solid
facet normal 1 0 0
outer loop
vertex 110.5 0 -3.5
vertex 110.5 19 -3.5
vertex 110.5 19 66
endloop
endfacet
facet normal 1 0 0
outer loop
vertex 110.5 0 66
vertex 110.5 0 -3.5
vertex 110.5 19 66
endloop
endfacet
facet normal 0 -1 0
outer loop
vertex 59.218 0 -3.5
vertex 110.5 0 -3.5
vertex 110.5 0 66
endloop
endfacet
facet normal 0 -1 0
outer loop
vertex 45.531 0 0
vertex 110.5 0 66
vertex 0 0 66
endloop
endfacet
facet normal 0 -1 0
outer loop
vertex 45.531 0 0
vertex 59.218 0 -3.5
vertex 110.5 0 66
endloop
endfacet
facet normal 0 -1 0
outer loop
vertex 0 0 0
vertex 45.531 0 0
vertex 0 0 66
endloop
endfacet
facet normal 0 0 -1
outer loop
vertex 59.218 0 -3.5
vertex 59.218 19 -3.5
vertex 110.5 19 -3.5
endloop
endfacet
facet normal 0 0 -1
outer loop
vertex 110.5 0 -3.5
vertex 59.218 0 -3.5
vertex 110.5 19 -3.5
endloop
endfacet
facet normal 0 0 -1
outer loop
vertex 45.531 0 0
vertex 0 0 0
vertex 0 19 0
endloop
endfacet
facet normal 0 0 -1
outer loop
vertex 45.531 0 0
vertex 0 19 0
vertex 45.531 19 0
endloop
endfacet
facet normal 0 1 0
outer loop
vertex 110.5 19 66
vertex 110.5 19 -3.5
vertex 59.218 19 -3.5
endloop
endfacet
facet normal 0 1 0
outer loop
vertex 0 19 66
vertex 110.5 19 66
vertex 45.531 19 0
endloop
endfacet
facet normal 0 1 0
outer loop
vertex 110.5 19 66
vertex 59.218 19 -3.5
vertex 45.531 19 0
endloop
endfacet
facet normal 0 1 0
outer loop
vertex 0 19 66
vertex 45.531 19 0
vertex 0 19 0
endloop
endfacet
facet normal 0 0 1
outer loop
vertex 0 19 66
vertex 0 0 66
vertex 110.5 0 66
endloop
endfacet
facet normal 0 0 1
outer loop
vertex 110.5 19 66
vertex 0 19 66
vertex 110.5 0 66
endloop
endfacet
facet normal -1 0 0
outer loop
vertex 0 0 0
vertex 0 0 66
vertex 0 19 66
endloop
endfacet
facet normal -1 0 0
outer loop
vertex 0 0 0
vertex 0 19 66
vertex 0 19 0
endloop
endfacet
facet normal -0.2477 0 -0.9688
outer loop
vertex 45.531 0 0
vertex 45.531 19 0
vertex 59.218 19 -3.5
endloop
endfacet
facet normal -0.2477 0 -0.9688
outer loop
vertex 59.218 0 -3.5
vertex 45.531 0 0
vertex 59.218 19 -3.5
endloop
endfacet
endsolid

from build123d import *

# Parameters (mm, degrees)
SKETCH_1_W      = 110.5
SKETCH_1_H      = 66
EXTRUDE_1_DEPTH = 19
EXTRUDE_2_DEPTH = 19


with BuildPart() as part:
    # 草图1 → 凸台-拉伸1 (new body)
    with BuildSketch(Plane(origin=(0, 0, 0), x_dir=(1, 0, 0), z_dir=(0, 1, 0))):
        with Locations((55.25, -33)):
            Rectangle(SKETCH_1_W, SKETCH_1_H)
    extrude(amount=EXTRUDE_1_DEPTH)

    # 草图2 → 凸台-拉伸2 (add)
    with BuildSketch(Plane(origin=(0, 19, 0), x_dir=(1, 0, 0), z_dir=(0, 1, 0))):
        Polygon((110.5, 0), (45.531109974, 0), (59.21801075, 3.5), (110.5, 3.5), align=None)
    extrude(amount=-EXTRUDE_2_DEPTH)


solid = part.part
